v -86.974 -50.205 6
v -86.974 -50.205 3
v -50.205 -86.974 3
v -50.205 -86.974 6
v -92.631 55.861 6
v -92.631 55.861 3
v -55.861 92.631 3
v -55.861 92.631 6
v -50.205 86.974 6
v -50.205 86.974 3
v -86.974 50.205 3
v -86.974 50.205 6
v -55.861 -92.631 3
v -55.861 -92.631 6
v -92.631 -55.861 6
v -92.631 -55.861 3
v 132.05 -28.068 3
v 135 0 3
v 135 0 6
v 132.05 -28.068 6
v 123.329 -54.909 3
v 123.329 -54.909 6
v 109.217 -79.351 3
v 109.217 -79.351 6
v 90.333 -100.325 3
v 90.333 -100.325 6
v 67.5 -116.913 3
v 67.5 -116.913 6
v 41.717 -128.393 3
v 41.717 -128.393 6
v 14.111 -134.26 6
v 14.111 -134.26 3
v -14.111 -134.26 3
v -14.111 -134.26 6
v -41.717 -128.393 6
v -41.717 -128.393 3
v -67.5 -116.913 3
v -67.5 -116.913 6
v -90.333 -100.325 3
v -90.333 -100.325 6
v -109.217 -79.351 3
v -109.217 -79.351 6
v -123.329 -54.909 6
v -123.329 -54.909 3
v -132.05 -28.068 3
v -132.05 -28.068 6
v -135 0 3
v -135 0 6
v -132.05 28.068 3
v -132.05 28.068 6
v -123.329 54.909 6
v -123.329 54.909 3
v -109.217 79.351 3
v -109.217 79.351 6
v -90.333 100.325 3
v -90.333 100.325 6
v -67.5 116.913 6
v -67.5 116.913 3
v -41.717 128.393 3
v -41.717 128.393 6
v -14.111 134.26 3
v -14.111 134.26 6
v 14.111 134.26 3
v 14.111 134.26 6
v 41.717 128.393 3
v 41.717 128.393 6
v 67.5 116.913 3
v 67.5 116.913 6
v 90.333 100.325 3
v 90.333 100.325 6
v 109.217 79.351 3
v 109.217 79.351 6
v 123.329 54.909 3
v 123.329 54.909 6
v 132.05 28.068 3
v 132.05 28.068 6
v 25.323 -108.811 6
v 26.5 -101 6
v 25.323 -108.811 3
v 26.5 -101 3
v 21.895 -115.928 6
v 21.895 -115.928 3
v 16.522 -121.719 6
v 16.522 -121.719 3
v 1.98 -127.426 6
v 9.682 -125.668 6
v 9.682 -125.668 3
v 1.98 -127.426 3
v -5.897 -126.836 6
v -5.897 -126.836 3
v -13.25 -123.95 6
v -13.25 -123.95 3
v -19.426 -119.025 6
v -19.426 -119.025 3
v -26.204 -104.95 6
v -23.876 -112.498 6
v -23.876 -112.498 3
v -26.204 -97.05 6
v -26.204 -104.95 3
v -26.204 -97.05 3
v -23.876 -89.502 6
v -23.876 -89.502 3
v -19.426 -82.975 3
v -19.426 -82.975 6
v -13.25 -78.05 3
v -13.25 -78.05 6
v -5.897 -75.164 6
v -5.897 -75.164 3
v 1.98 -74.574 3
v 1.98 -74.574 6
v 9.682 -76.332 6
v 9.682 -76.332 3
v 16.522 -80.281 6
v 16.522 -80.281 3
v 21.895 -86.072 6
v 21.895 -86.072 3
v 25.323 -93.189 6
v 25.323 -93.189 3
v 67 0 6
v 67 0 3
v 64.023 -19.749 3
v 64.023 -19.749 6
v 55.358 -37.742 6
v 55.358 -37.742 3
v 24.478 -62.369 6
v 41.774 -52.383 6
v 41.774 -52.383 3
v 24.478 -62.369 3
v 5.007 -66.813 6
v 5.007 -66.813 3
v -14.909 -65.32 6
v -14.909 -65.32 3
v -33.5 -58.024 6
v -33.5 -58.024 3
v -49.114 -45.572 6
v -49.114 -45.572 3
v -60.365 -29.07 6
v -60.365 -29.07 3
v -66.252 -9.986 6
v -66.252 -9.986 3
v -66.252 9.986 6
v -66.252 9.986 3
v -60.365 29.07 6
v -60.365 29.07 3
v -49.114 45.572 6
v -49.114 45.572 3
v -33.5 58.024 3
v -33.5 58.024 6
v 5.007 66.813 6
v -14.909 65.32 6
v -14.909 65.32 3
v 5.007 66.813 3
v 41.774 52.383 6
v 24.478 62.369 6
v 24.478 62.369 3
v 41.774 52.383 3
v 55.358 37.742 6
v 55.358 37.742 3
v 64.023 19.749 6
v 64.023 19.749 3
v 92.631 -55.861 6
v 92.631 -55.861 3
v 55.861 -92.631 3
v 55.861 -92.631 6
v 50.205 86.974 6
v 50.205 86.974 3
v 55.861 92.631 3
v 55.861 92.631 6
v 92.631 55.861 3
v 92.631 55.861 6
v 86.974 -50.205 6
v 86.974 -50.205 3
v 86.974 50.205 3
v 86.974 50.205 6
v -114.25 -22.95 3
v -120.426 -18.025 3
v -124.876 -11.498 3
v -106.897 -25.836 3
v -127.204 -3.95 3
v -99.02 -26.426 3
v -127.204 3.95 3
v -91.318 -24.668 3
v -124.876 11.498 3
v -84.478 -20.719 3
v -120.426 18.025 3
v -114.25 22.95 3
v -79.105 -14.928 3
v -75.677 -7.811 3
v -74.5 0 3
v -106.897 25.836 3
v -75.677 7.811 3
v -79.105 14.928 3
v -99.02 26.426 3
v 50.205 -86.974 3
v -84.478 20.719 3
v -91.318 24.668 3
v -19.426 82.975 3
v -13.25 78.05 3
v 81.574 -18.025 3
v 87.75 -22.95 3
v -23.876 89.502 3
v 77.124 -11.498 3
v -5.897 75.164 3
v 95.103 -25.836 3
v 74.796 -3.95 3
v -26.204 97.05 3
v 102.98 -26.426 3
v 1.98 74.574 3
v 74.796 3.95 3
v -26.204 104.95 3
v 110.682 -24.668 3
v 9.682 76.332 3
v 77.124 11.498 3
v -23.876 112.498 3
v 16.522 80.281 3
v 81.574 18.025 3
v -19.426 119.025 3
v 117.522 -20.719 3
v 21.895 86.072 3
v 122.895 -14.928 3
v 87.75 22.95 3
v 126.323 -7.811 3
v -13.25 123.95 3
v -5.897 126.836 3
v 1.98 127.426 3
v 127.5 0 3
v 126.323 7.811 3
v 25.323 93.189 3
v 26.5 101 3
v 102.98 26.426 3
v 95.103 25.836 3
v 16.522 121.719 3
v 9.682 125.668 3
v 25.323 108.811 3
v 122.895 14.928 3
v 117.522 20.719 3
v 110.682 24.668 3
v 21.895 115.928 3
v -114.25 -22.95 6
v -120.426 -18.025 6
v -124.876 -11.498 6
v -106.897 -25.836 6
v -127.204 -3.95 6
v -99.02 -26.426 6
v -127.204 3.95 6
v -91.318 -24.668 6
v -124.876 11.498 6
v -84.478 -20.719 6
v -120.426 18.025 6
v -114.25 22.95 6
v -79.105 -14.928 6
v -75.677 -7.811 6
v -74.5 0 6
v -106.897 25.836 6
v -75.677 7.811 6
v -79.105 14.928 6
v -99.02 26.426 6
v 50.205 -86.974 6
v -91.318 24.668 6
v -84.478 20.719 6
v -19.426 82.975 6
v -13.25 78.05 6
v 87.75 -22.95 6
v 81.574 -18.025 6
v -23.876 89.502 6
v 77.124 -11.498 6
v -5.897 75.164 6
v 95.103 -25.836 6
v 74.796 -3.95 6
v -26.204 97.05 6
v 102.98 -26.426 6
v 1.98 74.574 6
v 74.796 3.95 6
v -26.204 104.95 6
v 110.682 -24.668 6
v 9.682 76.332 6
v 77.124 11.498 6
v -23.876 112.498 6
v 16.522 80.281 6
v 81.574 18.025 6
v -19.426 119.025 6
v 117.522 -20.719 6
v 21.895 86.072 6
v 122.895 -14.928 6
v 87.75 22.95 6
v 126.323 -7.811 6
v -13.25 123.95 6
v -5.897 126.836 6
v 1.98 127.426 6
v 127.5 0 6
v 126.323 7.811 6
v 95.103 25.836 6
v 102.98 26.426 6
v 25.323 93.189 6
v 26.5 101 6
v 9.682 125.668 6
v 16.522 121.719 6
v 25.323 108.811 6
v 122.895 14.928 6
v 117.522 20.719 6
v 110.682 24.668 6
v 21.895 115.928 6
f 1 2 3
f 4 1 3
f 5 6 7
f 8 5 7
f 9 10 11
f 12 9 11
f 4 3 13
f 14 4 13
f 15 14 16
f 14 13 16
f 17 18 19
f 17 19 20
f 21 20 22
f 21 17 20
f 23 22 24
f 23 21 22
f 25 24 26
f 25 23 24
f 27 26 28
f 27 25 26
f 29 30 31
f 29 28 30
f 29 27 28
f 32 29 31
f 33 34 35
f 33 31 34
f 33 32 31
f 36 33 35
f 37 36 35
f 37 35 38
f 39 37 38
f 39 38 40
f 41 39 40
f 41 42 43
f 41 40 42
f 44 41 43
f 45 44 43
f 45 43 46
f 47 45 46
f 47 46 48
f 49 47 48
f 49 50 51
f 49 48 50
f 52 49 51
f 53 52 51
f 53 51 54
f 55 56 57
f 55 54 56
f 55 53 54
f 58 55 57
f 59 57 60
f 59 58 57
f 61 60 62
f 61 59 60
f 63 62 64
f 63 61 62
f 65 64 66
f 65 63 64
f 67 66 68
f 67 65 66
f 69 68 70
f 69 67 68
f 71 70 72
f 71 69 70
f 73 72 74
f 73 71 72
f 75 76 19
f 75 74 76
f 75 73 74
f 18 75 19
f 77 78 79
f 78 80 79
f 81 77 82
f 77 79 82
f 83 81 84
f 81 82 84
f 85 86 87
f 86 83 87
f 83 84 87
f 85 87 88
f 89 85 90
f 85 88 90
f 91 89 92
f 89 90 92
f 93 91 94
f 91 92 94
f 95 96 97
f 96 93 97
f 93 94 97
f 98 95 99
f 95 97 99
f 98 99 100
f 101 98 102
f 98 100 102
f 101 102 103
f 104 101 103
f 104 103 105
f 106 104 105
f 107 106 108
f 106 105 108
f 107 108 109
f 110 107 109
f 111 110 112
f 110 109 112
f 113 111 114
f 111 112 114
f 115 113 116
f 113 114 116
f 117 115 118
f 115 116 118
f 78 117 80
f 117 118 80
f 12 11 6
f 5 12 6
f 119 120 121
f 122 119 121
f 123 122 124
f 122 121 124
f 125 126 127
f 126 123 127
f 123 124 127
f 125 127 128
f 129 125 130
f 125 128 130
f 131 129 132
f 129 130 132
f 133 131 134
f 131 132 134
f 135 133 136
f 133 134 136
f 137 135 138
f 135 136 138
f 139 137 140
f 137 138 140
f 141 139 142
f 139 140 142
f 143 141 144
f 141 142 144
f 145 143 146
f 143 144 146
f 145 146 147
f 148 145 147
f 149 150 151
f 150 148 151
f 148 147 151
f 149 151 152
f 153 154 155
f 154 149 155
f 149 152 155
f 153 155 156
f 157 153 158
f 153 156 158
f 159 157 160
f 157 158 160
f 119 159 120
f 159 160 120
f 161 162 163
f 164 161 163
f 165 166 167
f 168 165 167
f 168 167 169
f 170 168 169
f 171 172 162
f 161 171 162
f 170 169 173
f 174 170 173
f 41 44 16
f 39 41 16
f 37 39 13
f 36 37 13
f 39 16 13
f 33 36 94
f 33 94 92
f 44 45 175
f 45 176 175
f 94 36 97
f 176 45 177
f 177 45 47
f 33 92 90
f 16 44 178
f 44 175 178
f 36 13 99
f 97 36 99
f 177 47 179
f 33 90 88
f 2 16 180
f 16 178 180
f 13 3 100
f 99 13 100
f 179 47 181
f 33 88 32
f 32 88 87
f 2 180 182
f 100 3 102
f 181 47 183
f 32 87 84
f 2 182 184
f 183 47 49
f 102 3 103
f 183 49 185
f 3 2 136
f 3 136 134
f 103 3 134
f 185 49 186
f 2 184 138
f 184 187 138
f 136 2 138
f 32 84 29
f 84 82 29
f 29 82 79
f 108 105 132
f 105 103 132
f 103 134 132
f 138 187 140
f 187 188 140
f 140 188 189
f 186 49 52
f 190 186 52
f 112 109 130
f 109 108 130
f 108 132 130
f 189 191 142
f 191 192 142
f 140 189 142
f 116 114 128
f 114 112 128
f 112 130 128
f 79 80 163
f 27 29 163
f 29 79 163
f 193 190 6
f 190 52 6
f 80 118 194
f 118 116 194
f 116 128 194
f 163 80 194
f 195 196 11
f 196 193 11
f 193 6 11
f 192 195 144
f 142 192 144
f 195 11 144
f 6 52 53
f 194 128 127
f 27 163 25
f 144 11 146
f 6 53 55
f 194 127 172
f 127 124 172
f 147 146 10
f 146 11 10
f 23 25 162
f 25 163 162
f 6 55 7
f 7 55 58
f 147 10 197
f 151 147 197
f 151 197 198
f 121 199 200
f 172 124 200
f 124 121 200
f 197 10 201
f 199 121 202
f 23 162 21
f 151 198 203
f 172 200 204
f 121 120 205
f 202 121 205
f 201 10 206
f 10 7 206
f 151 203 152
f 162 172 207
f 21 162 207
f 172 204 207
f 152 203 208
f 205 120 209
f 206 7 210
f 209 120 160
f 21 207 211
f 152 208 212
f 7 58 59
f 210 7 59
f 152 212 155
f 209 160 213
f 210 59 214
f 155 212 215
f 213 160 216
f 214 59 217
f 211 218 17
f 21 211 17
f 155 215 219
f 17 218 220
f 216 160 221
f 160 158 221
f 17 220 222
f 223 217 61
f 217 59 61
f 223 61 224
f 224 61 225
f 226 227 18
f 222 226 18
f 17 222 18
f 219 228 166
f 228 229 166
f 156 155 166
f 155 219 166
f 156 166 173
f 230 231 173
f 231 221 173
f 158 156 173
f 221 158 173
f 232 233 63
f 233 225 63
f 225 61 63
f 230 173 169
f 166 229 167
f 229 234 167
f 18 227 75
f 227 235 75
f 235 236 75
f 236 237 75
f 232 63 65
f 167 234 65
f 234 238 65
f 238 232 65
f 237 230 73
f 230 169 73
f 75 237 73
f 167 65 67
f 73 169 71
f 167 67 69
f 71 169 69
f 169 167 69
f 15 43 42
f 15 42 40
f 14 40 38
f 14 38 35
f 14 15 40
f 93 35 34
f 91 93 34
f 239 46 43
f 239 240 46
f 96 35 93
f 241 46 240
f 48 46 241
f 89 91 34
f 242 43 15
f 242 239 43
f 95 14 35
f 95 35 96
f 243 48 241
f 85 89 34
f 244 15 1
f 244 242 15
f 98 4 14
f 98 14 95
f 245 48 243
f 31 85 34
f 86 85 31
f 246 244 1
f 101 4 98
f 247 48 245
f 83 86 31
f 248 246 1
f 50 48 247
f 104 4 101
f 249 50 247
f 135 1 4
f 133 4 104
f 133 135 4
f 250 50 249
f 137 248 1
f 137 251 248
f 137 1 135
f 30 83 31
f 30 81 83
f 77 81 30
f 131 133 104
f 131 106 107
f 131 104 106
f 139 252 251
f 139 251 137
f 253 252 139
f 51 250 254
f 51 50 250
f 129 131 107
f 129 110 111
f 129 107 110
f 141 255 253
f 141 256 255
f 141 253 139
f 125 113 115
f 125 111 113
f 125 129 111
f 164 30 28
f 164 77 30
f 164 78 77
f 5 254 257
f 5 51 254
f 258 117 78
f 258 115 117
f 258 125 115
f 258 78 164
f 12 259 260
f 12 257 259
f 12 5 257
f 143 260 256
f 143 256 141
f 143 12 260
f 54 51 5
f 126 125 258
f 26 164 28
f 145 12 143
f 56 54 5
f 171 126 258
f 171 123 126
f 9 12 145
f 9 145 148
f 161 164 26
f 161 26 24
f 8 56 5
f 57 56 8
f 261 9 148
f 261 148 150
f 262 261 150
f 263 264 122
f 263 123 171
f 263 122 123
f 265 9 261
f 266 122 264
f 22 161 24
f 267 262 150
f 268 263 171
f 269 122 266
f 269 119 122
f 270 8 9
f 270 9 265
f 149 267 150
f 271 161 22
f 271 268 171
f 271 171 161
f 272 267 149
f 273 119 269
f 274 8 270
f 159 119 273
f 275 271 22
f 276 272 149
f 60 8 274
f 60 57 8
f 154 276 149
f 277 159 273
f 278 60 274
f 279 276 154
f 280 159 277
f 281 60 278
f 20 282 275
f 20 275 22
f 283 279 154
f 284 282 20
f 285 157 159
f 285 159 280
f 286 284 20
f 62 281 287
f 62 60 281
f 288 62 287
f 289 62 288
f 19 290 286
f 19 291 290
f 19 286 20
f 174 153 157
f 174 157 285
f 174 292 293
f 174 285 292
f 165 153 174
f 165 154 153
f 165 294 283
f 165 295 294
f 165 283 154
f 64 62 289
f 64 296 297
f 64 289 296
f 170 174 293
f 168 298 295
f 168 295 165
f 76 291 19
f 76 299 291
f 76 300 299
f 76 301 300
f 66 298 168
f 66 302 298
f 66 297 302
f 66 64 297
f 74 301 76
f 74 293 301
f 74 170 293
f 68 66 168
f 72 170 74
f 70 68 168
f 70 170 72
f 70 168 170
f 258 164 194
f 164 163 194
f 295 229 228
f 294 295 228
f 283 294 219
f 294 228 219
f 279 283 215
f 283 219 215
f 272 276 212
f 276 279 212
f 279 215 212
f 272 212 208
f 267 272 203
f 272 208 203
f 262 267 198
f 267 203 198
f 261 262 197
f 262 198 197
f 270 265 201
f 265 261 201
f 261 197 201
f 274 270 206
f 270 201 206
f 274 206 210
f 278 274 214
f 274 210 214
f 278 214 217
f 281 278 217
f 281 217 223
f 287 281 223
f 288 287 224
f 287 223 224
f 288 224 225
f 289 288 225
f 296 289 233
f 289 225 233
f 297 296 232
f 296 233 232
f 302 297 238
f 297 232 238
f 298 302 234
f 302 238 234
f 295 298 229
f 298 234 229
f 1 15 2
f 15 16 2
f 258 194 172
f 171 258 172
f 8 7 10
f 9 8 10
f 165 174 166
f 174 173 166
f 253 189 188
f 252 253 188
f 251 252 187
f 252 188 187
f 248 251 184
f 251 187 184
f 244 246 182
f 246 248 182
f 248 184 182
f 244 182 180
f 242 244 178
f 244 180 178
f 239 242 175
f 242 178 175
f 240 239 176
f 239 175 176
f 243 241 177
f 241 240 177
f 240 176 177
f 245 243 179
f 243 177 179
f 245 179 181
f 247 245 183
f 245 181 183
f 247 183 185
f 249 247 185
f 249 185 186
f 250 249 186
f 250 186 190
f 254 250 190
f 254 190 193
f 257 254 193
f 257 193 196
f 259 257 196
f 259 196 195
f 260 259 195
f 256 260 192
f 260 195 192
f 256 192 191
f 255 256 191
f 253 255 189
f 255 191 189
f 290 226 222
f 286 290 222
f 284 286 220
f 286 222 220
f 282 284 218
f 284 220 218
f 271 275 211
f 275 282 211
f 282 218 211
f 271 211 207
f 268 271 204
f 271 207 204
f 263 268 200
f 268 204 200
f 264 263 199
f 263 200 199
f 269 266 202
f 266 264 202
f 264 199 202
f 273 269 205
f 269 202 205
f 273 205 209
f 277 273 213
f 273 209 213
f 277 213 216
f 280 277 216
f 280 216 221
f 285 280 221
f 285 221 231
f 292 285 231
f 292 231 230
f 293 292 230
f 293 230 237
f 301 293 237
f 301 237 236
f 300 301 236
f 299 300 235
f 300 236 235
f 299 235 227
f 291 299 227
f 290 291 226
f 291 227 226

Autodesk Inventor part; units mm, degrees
ref_plane "YZ Plane" through (0, 0, 0) normal (1, 0, 0) x (0, 1, 0)
ref_plane "XZ Plane" through (0, 0, 0) normal (0, 1, 0) x (-1, 0, 0)
ref_plane "XY Plane" through (0, 0, 0) normal (0, 0, 1) x (1, 0, 0)
ref_plane "РабПлоскость1" through (0, 0, 3) normal (0, 0, 1) x (1, 0, 0)
sketch "Эскиз1" plane through (0, 0, 3) normal (0, 0, 1) x (1, 0, 0)
  circle A0 centre (0, 0) radius 101 construction
  circle A1 centre (0, 0) radius 135 projected
  line L0 (0, 0) -> (0, 153.023) construction
  circle A2 centre (0, 101) radius 26.5
  line L1 (86.9741, 51.6188) -> (51.6188, 86.9741) construction
  line L2 (51.6188, 86.9741) -> (55.8614, 91.2168) construction
  line L3 (55.8614, 91.2168) -> (91.2168, 55.8614) construction
  line L4 (91.2168, 55.8614) -> (86.9741, 51.6188) construction
  line L5 (86.9741, 51.6188) -> (55.8614, 91.2168) construction
  line L6 (51.6188, 86.9741) -> (91.2168, 55.8614) construction
  line L7 (86.9741, 50.2046) -> (50.2046, 86.9741)
  line L8 (50.2046, 86.9741) -> (55.8614, 92.631)
  line L9 (55.8614, 92.631) -> (92.631, 55.8614)
  line L10 (92.631, 55.8614) -> (86.9741, 50.2046)
  line L11 (86.9741, 50.2046) -> (55.8614, 92.631) construction
  line L12 (50.2046, 86.9741) -> (92.631, 55.8614) construction
  line L13 (-86.9741, 51.6188) -> (-91.2168, 55.8614) construction
  line L14 (-86.9741, 50.2046) -> (-92.631, 55.8614)
  circle A3 centre (-101, 0) radius 26.5
  line L15 (-91.2168, 55.8614) -> (-55.8614, 91.2168) construction
  line L16 (-86.9741, 51.6188) -> (-55.8614, 91.2168) construction
  line L17 (-51.6188, 86.9741) -> (-86.9741, 51.6188) construction
  line L18 (-51.6188, 86.9741) -> (-91.2168, 55.8614) construction
  line L19 (-86.9741, 50.2046) -> (-55.8614, 92.631) construction
  line L20 (-50.2046, 86.9741) -> (-86.9741, 50.2046)
  line L21 (-50.2046, 86.9741) -> (-92.631, 55.8614) construction
  line L22 (-55.8614, 91.2168) -> (-51.6188, 86.9741) construction
  line L23 (-55.8614, 92.631) -> (-50.2046, 86.9741)
  line L24 (-92.631, 55.8614) -> (-55.8614, 92.631)
  line L25 (-51.6188, -86.9741) -> (-55.8614, -91.2168) construction
  line L26 (-50.2046, -86.9741) -> (-55.8614, -92.631)
  circle A4 centre (0, -101) radius 26.5
  line L27 (-55.8614, -91.2168) -> (-91.2168, -55.8614) construction
  line L28 (-51.6188, -86.9741) -> (-91.2168, -55.8614) construction
  line L29 (-86.9741, -51.6188) -> (-51.6188, -86.9741) construction
  line L30 (-86.9741, -51.6188) -> (-55.8614, -91.2168) construction
  line L31 (-50.2046, -86.9741) -> (-92.631, -55.8614) construction
  line L32 (-86.9741, -50.2046) -> (-50.2046, -86.9741)
  line L33 (-86.9741, -50.2046) -> (-55.8614, -92.631) construction
  line L34 (-91.2168, -55.8614) -> (-86.9741, -51.6188) construction
  line L35 (-92.631, -55.8614) -> (-86.9741, -50.2046)
  line L36 (-55.8614, -92.631) -> (-92.631, -55.8614)
  line L37 (86.9741, -51.6188) -> (91.2168, -55.8614) construction
  line L38 (86.9741, -50.2046) -> (92.631, -55.8614)
  circle A5 centre (101, 0) radius 26.5
  line L39 (91.2168, -55.8614) -> (55.8614, -91.2168) construction
  line L40 (86.9741, -51.6188) -> (55.8614, -91.2168) construction
  line L41 (51.6188, -86.9741) -> (86.9741, -51.6188) construction
  line L42 (51.6188, -86.9741) -> (91.2168, -55.8614) construction
  line L43 (86.9741, -50.2046) -> (55.8614, -92.631) construction
  line L44 (50.2046, -86.9741) -> (86.9741, -50.2046)
  line L45 (50.2046, -86.9741) -> (92.631, -55.8614) construction
  line L46 (55.8614, -91.2168) -> (51.6188, -86.9741) construction
  line L47 (55.8614, -92.631) -> (50.2046, -86.9741)
  line L48 (92.631, -55.8614) -> (55.8614, -92.631)
  circle A6 centre (0, 0) radius 67
  point P0 (71.4178, 71.4178)
  point P1 (-71.4178, 71.4178)
  point P2 (-71.4178, -71.4178)
  point P3 (71.4178, -71.4178)
  dimension "d0" = 202
  dimension "d1" = 53
  dimension "d2" = 1
  dimension "d3" = 1
  dimension "d6" = 360
  dimension "d8" = 34
  dimension "d9" = 34
extrude "Выдавливание1" add sketch "Эскиз1" along normal blind 3
equation "\"d9\" = d8"
properties part number "Диск_базирующий_В5" material "По умолчанию1"
